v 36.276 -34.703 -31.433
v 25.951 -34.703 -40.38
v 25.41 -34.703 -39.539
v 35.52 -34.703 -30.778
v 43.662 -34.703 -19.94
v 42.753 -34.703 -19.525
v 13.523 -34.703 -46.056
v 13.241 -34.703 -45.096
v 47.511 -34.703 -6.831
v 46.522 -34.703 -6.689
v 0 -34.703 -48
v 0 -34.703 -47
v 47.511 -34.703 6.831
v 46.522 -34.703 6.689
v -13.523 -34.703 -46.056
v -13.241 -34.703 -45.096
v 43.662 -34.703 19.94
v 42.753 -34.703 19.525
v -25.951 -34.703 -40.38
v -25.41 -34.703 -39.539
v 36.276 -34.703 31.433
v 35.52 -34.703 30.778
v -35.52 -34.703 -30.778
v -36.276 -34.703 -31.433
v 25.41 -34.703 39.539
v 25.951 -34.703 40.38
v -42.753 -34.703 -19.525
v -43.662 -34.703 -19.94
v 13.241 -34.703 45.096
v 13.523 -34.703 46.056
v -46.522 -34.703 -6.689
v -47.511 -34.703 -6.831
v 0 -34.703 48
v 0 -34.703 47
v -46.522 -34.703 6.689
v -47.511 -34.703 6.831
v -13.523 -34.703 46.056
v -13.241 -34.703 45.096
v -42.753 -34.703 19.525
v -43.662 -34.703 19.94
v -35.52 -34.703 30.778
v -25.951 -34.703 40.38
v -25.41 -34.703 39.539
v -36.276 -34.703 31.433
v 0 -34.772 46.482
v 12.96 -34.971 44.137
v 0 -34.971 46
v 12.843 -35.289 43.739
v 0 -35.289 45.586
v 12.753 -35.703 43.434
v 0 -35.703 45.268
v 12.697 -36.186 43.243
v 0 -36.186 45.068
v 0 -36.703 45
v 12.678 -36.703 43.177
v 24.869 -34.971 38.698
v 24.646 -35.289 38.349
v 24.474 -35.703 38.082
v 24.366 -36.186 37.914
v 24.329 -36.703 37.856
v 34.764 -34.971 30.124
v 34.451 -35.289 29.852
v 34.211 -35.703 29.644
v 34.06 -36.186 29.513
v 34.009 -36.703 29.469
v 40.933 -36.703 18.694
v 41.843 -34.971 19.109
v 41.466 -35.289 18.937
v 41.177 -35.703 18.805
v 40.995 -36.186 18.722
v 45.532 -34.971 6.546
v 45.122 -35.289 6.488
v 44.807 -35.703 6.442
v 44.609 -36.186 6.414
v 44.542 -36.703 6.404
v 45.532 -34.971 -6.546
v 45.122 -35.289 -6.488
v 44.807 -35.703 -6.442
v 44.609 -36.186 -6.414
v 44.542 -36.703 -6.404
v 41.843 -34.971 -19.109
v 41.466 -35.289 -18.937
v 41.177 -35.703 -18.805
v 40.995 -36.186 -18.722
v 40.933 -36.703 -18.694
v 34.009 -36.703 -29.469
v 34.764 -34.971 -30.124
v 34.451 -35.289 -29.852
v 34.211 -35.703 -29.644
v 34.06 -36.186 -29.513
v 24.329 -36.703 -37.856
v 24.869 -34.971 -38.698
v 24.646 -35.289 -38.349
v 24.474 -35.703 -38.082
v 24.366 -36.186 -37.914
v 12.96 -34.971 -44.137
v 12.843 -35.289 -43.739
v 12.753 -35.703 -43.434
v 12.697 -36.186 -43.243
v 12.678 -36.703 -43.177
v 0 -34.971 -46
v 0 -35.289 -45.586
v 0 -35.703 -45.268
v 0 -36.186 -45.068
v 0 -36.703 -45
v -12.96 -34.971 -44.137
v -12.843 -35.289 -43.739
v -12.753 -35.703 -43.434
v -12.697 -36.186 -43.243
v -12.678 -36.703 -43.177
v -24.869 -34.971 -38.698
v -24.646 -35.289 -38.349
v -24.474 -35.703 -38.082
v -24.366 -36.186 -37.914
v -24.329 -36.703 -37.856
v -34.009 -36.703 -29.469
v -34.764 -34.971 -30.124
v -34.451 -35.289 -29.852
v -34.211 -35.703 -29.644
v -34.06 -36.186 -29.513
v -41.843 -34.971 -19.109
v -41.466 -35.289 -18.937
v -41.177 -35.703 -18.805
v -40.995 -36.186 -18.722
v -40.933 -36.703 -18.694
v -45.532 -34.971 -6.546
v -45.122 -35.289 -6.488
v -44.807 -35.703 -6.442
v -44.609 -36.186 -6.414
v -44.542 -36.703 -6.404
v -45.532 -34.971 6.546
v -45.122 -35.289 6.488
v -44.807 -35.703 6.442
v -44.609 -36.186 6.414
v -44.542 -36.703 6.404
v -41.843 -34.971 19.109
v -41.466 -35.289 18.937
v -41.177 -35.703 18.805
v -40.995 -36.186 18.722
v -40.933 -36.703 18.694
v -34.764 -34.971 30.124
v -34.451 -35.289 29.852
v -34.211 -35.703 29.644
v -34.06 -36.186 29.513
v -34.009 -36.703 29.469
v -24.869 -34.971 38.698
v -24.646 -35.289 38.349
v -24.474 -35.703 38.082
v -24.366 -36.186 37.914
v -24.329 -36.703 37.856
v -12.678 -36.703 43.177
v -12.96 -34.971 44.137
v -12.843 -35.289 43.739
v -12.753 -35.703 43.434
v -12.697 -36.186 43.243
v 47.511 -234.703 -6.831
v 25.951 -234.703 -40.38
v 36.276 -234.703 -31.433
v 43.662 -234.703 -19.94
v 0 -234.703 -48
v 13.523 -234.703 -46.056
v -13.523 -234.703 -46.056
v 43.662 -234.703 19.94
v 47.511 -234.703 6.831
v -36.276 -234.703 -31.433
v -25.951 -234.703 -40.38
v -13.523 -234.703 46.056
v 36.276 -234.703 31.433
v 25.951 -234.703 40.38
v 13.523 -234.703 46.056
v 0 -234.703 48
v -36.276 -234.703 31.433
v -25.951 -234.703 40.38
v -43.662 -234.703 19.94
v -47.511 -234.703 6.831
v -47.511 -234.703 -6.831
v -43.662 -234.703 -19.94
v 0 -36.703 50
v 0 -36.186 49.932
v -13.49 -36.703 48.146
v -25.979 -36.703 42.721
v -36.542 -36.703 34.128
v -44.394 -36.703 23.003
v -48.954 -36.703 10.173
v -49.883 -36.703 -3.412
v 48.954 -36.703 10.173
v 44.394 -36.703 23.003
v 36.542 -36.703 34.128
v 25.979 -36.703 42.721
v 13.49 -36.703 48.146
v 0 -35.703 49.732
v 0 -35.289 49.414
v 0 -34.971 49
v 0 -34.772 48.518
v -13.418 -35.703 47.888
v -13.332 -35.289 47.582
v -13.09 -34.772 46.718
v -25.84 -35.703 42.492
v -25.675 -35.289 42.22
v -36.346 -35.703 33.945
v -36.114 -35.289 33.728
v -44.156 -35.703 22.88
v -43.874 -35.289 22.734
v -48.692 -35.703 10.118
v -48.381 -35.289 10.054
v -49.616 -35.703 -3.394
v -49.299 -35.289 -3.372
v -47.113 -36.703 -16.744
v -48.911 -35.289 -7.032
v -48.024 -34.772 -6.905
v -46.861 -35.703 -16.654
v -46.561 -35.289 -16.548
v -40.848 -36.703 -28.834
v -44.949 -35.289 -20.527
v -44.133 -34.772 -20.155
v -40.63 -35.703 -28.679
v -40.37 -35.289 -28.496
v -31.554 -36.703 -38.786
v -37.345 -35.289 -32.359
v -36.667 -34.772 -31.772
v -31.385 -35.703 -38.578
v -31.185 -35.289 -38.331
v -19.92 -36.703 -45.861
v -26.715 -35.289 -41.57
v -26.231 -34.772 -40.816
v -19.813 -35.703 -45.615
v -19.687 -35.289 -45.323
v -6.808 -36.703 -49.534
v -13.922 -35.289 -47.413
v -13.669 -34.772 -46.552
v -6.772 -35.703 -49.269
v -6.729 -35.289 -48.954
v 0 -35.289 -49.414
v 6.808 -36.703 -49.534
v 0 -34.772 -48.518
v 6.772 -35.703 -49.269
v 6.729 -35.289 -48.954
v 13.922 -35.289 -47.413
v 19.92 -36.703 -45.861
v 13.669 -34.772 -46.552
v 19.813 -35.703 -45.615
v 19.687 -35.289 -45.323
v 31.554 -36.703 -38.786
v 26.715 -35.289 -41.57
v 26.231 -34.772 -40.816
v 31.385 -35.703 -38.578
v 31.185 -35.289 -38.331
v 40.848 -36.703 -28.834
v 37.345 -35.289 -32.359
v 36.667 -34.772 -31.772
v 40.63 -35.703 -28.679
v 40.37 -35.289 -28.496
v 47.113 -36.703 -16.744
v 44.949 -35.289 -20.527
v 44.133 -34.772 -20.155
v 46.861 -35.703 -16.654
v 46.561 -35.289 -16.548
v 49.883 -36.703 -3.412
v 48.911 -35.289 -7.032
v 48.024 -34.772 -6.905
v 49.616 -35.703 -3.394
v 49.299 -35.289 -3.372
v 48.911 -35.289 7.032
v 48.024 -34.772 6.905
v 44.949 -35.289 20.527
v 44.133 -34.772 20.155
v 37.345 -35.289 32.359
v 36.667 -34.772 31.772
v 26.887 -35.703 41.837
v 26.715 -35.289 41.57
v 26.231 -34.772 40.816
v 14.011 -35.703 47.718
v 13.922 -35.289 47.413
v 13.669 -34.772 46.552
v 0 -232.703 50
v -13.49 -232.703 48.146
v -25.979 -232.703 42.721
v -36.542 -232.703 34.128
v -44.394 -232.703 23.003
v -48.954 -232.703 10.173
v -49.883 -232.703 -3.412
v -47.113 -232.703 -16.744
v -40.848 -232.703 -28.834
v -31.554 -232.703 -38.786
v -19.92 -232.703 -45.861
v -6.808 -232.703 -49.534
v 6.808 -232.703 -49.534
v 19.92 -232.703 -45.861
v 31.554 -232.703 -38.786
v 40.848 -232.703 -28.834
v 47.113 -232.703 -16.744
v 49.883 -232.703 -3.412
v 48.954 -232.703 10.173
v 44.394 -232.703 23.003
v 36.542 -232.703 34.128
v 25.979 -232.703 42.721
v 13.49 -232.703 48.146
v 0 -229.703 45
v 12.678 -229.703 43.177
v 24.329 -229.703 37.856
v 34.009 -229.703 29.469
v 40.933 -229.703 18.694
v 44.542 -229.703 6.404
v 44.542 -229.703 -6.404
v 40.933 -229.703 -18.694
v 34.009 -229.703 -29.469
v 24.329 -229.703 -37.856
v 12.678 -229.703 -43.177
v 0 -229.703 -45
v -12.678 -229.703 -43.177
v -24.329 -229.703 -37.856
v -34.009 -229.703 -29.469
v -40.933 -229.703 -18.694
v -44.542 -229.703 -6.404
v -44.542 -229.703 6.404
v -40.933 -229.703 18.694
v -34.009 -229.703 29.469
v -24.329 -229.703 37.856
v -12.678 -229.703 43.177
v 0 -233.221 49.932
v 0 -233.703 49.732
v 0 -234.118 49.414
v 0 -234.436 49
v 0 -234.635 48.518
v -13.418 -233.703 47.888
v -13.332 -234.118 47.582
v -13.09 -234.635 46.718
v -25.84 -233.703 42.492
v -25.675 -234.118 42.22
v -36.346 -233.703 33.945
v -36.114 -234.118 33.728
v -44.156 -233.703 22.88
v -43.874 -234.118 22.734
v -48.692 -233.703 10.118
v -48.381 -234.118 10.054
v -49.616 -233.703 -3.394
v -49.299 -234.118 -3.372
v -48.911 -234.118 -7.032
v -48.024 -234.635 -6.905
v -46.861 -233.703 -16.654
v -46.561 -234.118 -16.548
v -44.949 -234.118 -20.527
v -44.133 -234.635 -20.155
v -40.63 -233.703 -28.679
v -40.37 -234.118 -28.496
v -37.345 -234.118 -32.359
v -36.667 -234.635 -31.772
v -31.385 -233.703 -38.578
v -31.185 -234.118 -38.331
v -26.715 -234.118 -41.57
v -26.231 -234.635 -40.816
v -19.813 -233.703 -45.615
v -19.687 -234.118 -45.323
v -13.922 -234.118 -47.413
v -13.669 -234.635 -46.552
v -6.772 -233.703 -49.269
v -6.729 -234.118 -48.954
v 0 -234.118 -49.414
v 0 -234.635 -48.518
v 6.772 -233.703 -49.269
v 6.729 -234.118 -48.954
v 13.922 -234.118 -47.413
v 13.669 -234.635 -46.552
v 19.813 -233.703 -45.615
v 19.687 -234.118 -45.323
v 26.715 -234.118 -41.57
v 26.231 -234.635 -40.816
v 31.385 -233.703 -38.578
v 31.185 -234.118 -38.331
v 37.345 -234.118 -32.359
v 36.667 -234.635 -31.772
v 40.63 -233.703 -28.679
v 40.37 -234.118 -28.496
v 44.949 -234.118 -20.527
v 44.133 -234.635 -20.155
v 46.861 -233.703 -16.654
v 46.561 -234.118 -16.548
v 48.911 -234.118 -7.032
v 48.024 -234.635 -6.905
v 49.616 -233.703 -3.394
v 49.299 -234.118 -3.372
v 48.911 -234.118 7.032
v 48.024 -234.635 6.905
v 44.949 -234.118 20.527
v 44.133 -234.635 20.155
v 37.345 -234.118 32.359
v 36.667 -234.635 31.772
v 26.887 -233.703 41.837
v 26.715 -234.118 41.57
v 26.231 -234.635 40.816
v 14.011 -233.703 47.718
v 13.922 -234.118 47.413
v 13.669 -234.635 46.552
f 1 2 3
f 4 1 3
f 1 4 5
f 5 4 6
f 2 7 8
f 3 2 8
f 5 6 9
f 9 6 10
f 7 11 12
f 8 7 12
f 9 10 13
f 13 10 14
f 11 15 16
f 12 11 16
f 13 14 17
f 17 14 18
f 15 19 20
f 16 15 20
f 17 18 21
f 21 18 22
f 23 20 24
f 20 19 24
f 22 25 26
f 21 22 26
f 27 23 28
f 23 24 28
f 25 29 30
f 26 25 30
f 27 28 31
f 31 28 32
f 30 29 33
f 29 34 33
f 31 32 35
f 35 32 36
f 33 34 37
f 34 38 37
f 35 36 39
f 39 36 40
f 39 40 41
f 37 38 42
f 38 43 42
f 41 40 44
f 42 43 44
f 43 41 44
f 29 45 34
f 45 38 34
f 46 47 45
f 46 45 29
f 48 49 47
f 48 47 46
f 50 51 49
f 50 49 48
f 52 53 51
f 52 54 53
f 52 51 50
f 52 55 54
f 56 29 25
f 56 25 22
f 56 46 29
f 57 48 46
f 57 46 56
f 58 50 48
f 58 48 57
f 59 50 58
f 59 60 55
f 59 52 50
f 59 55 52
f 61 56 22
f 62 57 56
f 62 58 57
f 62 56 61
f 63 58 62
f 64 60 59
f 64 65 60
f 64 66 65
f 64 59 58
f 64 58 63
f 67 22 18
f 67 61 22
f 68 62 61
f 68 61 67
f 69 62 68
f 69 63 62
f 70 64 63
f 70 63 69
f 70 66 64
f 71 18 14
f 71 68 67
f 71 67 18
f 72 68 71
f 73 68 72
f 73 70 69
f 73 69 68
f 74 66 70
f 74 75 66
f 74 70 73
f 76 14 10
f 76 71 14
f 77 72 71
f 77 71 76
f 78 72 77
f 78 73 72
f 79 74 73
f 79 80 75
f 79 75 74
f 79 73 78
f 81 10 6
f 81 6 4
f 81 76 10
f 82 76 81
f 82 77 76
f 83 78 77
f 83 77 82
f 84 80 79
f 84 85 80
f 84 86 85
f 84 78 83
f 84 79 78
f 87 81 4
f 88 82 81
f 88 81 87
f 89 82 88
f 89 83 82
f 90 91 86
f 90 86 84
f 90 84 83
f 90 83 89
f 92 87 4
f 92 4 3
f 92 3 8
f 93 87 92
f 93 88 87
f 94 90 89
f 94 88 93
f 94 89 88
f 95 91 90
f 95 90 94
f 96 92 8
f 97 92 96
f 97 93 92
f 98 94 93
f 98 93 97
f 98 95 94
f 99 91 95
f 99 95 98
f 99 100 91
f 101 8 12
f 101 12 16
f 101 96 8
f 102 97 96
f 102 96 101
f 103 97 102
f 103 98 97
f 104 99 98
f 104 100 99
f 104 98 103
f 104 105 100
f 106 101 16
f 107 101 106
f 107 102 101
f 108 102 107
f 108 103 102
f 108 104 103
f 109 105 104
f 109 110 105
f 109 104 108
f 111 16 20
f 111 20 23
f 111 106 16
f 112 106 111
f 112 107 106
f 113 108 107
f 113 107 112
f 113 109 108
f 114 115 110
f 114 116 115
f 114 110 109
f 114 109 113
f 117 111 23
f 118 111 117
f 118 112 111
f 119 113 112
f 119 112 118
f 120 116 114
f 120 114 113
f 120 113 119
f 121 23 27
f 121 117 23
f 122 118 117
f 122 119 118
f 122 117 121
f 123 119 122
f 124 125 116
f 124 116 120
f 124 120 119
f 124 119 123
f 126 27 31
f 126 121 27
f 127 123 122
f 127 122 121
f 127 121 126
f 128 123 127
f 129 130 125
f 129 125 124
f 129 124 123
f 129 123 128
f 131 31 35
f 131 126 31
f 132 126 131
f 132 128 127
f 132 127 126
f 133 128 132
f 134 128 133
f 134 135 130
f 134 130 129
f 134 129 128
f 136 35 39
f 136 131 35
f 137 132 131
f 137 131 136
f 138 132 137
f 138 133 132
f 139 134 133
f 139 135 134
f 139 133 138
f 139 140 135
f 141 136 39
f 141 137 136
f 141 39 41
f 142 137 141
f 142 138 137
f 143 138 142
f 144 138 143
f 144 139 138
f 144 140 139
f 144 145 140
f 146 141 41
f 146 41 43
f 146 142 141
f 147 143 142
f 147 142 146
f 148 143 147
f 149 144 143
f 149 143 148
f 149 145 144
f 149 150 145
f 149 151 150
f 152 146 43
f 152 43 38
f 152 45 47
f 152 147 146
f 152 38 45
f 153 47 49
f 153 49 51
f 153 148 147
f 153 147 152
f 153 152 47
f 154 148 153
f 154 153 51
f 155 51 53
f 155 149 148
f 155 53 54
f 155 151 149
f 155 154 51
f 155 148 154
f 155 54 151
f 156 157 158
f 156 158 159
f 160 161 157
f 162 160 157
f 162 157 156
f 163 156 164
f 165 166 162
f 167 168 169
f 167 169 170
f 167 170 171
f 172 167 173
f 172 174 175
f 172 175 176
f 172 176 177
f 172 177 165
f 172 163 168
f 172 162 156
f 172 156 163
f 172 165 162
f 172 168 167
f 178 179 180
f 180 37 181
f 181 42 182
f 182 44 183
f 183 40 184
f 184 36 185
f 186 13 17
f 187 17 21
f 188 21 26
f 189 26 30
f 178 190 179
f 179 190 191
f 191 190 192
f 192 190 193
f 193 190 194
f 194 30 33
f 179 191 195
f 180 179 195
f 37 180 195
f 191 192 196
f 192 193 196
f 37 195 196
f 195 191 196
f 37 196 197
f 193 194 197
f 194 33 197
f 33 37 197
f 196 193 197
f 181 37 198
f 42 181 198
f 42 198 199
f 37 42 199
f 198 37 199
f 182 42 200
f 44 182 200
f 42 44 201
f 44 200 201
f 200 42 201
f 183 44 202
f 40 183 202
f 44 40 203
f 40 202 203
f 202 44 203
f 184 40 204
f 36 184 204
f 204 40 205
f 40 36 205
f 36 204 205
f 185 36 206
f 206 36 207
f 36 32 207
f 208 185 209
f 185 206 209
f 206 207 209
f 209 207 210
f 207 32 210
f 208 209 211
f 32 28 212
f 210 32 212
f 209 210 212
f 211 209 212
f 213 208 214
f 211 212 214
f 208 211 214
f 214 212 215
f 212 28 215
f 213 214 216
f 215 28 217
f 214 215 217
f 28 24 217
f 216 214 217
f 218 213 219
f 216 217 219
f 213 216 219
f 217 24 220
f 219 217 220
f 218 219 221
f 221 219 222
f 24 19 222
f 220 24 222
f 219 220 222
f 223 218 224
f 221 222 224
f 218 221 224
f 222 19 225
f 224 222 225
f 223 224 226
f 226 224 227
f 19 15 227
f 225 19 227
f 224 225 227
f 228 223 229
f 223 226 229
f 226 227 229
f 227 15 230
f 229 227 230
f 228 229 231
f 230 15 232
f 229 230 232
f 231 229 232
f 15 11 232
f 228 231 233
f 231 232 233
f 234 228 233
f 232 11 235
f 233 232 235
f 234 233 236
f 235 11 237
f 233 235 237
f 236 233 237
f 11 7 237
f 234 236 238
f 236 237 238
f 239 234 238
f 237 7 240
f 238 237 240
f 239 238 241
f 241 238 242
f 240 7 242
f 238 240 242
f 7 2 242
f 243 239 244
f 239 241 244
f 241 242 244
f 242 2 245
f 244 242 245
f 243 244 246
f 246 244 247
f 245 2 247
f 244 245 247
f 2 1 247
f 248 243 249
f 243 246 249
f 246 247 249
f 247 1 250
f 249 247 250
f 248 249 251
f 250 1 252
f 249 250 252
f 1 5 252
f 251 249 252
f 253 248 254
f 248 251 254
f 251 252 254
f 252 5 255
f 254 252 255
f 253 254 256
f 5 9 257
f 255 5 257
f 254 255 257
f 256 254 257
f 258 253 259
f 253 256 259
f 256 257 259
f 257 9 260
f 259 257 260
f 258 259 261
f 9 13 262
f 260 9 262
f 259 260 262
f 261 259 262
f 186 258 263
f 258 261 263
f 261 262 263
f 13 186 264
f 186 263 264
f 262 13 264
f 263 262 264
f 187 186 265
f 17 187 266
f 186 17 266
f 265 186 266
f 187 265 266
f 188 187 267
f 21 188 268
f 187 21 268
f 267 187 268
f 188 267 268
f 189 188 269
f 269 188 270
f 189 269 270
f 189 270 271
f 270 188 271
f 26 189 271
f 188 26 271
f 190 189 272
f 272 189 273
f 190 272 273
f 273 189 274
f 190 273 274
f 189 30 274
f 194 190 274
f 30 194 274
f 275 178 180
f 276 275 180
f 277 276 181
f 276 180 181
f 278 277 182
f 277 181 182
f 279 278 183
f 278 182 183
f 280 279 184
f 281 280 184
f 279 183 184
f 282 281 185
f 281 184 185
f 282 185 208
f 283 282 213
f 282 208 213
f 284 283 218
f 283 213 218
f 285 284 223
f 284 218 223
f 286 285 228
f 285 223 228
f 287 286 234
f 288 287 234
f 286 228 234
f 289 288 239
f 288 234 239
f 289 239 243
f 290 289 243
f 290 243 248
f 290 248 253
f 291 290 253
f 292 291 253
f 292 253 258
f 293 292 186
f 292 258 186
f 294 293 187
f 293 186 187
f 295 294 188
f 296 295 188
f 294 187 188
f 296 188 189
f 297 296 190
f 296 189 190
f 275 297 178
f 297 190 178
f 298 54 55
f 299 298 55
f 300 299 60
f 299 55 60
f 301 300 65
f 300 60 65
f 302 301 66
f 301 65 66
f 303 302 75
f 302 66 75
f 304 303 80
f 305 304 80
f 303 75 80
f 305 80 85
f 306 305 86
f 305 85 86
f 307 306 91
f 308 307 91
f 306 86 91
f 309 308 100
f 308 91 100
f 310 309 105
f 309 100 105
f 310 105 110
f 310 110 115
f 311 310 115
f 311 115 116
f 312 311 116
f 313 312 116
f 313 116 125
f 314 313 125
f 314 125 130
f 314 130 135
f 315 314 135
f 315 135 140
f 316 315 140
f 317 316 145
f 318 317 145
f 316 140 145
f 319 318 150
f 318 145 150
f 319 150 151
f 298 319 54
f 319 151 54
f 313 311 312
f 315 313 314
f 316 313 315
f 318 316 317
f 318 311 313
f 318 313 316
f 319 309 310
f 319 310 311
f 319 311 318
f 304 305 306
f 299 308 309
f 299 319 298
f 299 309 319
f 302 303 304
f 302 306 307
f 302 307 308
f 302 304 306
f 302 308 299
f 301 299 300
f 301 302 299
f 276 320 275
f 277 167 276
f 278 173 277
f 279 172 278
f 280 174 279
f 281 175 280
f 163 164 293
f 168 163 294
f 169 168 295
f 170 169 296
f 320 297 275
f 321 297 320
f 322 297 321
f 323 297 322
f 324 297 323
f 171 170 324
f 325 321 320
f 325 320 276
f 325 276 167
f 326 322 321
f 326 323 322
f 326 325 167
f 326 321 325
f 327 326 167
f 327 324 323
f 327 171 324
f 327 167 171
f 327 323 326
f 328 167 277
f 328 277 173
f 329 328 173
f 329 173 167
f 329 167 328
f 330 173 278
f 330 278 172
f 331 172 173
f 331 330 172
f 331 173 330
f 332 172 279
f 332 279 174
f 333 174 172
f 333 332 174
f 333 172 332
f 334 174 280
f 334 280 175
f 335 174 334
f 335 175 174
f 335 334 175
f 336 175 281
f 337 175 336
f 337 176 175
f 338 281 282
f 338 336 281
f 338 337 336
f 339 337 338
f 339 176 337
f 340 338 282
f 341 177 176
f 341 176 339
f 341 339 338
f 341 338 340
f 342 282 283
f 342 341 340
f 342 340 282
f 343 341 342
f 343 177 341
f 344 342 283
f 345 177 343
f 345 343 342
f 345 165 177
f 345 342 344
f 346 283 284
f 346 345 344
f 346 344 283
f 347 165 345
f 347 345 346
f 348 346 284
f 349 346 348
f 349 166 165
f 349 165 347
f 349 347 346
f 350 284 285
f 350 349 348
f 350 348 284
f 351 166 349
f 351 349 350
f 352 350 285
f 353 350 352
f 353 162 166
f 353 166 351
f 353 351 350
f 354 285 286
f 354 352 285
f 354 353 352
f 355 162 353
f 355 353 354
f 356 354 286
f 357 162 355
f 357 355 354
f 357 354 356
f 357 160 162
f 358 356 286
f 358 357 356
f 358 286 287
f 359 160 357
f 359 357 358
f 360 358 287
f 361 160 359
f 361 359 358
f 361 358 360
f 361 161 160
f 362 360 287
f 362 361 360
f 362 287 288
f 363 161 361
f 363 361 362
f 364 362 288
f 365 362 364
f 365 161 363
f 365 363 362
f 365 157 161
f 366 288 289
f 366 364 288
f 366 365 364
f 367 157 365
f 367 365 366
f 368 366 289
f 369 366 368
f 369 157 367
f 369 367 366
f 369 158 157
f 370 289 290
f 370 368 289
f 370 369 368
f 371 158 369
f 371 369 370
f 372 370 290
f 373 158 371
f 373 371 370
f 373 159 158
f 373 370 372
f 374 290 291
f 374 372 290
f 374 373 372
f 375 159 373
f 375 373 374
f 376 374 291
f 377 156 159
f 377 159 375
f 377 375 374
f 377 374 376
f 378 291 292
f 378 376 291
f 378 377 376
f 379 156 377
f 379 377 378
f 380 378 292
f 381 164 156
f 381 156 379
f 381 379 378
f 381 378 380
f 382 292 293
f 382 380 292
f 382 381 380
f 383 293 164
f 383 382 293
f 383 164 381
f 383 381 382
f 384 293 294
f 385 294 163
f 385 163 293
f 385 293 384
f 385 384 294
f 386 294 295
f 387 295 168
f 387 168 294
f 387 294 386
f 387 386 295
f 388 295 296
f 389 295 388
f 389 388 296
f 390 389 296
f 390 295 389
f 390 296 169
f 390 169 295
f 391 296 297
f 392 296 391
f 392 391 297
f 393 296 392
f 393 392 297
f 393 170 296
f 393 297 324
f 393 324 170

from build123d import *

# Parameters (mm, degrees)
SKETCH1_W          = 50
SKETCH1_H          = 200
SKETCH2_R          = 45
CUT_EXTRUDE1_DEPTH = 195
FILLET2_R          = 2
FILLET3_R          = 2


with BuildPart() as part:
    # Sketch1 → Revolve1 (revolve)
    with BuildSketch(Plane.XY, mode=Mode.PRIVATE) as revolve1_sk:
        with Locations((-25, -134.703470817)):
            Rectangle(SKETCH1_W, SKETCH1_H)
    revolve(revolve1_sk.sketch.rotate(Axis((0, 0, 0), (0, -1, 0)), 270), axis=Axis((0, 0, 0), (0, -1, 0)))

    # Sketch2 → Cut-Extrude1 (cut)
    with BuildSketch(Plane(origin=(0, -34.703470817, 0), x_dir=(1, 0, 0), z_dir=(0, 1, 0))):
        with Locations(Location((0, 0, 0), (0, 0, 270))):
            Circle(SKETCH2_R)
    extrude(amount=-CUT_EXTRUDE1_DEPTH, mode=Mode.SUBTRACT)

    # Fillet2
    fillet2_edges = [part.edges().sort_by_distance(p)[0] for p in [
        (0, -34.703470817, -50),
        (0, -34.703470817, -45),
    ]]
    fillet(fillet2_edges, radius=FILLET2_R)

    # Fillet3
    fillet3_edges = [part.edges().sort_by_distance(p)[0] for p in [
        (0, -234.703470817, -50),
    ]]
    fillet(fillet3_edges, radius=FILLET3_R)


solid = part.part
